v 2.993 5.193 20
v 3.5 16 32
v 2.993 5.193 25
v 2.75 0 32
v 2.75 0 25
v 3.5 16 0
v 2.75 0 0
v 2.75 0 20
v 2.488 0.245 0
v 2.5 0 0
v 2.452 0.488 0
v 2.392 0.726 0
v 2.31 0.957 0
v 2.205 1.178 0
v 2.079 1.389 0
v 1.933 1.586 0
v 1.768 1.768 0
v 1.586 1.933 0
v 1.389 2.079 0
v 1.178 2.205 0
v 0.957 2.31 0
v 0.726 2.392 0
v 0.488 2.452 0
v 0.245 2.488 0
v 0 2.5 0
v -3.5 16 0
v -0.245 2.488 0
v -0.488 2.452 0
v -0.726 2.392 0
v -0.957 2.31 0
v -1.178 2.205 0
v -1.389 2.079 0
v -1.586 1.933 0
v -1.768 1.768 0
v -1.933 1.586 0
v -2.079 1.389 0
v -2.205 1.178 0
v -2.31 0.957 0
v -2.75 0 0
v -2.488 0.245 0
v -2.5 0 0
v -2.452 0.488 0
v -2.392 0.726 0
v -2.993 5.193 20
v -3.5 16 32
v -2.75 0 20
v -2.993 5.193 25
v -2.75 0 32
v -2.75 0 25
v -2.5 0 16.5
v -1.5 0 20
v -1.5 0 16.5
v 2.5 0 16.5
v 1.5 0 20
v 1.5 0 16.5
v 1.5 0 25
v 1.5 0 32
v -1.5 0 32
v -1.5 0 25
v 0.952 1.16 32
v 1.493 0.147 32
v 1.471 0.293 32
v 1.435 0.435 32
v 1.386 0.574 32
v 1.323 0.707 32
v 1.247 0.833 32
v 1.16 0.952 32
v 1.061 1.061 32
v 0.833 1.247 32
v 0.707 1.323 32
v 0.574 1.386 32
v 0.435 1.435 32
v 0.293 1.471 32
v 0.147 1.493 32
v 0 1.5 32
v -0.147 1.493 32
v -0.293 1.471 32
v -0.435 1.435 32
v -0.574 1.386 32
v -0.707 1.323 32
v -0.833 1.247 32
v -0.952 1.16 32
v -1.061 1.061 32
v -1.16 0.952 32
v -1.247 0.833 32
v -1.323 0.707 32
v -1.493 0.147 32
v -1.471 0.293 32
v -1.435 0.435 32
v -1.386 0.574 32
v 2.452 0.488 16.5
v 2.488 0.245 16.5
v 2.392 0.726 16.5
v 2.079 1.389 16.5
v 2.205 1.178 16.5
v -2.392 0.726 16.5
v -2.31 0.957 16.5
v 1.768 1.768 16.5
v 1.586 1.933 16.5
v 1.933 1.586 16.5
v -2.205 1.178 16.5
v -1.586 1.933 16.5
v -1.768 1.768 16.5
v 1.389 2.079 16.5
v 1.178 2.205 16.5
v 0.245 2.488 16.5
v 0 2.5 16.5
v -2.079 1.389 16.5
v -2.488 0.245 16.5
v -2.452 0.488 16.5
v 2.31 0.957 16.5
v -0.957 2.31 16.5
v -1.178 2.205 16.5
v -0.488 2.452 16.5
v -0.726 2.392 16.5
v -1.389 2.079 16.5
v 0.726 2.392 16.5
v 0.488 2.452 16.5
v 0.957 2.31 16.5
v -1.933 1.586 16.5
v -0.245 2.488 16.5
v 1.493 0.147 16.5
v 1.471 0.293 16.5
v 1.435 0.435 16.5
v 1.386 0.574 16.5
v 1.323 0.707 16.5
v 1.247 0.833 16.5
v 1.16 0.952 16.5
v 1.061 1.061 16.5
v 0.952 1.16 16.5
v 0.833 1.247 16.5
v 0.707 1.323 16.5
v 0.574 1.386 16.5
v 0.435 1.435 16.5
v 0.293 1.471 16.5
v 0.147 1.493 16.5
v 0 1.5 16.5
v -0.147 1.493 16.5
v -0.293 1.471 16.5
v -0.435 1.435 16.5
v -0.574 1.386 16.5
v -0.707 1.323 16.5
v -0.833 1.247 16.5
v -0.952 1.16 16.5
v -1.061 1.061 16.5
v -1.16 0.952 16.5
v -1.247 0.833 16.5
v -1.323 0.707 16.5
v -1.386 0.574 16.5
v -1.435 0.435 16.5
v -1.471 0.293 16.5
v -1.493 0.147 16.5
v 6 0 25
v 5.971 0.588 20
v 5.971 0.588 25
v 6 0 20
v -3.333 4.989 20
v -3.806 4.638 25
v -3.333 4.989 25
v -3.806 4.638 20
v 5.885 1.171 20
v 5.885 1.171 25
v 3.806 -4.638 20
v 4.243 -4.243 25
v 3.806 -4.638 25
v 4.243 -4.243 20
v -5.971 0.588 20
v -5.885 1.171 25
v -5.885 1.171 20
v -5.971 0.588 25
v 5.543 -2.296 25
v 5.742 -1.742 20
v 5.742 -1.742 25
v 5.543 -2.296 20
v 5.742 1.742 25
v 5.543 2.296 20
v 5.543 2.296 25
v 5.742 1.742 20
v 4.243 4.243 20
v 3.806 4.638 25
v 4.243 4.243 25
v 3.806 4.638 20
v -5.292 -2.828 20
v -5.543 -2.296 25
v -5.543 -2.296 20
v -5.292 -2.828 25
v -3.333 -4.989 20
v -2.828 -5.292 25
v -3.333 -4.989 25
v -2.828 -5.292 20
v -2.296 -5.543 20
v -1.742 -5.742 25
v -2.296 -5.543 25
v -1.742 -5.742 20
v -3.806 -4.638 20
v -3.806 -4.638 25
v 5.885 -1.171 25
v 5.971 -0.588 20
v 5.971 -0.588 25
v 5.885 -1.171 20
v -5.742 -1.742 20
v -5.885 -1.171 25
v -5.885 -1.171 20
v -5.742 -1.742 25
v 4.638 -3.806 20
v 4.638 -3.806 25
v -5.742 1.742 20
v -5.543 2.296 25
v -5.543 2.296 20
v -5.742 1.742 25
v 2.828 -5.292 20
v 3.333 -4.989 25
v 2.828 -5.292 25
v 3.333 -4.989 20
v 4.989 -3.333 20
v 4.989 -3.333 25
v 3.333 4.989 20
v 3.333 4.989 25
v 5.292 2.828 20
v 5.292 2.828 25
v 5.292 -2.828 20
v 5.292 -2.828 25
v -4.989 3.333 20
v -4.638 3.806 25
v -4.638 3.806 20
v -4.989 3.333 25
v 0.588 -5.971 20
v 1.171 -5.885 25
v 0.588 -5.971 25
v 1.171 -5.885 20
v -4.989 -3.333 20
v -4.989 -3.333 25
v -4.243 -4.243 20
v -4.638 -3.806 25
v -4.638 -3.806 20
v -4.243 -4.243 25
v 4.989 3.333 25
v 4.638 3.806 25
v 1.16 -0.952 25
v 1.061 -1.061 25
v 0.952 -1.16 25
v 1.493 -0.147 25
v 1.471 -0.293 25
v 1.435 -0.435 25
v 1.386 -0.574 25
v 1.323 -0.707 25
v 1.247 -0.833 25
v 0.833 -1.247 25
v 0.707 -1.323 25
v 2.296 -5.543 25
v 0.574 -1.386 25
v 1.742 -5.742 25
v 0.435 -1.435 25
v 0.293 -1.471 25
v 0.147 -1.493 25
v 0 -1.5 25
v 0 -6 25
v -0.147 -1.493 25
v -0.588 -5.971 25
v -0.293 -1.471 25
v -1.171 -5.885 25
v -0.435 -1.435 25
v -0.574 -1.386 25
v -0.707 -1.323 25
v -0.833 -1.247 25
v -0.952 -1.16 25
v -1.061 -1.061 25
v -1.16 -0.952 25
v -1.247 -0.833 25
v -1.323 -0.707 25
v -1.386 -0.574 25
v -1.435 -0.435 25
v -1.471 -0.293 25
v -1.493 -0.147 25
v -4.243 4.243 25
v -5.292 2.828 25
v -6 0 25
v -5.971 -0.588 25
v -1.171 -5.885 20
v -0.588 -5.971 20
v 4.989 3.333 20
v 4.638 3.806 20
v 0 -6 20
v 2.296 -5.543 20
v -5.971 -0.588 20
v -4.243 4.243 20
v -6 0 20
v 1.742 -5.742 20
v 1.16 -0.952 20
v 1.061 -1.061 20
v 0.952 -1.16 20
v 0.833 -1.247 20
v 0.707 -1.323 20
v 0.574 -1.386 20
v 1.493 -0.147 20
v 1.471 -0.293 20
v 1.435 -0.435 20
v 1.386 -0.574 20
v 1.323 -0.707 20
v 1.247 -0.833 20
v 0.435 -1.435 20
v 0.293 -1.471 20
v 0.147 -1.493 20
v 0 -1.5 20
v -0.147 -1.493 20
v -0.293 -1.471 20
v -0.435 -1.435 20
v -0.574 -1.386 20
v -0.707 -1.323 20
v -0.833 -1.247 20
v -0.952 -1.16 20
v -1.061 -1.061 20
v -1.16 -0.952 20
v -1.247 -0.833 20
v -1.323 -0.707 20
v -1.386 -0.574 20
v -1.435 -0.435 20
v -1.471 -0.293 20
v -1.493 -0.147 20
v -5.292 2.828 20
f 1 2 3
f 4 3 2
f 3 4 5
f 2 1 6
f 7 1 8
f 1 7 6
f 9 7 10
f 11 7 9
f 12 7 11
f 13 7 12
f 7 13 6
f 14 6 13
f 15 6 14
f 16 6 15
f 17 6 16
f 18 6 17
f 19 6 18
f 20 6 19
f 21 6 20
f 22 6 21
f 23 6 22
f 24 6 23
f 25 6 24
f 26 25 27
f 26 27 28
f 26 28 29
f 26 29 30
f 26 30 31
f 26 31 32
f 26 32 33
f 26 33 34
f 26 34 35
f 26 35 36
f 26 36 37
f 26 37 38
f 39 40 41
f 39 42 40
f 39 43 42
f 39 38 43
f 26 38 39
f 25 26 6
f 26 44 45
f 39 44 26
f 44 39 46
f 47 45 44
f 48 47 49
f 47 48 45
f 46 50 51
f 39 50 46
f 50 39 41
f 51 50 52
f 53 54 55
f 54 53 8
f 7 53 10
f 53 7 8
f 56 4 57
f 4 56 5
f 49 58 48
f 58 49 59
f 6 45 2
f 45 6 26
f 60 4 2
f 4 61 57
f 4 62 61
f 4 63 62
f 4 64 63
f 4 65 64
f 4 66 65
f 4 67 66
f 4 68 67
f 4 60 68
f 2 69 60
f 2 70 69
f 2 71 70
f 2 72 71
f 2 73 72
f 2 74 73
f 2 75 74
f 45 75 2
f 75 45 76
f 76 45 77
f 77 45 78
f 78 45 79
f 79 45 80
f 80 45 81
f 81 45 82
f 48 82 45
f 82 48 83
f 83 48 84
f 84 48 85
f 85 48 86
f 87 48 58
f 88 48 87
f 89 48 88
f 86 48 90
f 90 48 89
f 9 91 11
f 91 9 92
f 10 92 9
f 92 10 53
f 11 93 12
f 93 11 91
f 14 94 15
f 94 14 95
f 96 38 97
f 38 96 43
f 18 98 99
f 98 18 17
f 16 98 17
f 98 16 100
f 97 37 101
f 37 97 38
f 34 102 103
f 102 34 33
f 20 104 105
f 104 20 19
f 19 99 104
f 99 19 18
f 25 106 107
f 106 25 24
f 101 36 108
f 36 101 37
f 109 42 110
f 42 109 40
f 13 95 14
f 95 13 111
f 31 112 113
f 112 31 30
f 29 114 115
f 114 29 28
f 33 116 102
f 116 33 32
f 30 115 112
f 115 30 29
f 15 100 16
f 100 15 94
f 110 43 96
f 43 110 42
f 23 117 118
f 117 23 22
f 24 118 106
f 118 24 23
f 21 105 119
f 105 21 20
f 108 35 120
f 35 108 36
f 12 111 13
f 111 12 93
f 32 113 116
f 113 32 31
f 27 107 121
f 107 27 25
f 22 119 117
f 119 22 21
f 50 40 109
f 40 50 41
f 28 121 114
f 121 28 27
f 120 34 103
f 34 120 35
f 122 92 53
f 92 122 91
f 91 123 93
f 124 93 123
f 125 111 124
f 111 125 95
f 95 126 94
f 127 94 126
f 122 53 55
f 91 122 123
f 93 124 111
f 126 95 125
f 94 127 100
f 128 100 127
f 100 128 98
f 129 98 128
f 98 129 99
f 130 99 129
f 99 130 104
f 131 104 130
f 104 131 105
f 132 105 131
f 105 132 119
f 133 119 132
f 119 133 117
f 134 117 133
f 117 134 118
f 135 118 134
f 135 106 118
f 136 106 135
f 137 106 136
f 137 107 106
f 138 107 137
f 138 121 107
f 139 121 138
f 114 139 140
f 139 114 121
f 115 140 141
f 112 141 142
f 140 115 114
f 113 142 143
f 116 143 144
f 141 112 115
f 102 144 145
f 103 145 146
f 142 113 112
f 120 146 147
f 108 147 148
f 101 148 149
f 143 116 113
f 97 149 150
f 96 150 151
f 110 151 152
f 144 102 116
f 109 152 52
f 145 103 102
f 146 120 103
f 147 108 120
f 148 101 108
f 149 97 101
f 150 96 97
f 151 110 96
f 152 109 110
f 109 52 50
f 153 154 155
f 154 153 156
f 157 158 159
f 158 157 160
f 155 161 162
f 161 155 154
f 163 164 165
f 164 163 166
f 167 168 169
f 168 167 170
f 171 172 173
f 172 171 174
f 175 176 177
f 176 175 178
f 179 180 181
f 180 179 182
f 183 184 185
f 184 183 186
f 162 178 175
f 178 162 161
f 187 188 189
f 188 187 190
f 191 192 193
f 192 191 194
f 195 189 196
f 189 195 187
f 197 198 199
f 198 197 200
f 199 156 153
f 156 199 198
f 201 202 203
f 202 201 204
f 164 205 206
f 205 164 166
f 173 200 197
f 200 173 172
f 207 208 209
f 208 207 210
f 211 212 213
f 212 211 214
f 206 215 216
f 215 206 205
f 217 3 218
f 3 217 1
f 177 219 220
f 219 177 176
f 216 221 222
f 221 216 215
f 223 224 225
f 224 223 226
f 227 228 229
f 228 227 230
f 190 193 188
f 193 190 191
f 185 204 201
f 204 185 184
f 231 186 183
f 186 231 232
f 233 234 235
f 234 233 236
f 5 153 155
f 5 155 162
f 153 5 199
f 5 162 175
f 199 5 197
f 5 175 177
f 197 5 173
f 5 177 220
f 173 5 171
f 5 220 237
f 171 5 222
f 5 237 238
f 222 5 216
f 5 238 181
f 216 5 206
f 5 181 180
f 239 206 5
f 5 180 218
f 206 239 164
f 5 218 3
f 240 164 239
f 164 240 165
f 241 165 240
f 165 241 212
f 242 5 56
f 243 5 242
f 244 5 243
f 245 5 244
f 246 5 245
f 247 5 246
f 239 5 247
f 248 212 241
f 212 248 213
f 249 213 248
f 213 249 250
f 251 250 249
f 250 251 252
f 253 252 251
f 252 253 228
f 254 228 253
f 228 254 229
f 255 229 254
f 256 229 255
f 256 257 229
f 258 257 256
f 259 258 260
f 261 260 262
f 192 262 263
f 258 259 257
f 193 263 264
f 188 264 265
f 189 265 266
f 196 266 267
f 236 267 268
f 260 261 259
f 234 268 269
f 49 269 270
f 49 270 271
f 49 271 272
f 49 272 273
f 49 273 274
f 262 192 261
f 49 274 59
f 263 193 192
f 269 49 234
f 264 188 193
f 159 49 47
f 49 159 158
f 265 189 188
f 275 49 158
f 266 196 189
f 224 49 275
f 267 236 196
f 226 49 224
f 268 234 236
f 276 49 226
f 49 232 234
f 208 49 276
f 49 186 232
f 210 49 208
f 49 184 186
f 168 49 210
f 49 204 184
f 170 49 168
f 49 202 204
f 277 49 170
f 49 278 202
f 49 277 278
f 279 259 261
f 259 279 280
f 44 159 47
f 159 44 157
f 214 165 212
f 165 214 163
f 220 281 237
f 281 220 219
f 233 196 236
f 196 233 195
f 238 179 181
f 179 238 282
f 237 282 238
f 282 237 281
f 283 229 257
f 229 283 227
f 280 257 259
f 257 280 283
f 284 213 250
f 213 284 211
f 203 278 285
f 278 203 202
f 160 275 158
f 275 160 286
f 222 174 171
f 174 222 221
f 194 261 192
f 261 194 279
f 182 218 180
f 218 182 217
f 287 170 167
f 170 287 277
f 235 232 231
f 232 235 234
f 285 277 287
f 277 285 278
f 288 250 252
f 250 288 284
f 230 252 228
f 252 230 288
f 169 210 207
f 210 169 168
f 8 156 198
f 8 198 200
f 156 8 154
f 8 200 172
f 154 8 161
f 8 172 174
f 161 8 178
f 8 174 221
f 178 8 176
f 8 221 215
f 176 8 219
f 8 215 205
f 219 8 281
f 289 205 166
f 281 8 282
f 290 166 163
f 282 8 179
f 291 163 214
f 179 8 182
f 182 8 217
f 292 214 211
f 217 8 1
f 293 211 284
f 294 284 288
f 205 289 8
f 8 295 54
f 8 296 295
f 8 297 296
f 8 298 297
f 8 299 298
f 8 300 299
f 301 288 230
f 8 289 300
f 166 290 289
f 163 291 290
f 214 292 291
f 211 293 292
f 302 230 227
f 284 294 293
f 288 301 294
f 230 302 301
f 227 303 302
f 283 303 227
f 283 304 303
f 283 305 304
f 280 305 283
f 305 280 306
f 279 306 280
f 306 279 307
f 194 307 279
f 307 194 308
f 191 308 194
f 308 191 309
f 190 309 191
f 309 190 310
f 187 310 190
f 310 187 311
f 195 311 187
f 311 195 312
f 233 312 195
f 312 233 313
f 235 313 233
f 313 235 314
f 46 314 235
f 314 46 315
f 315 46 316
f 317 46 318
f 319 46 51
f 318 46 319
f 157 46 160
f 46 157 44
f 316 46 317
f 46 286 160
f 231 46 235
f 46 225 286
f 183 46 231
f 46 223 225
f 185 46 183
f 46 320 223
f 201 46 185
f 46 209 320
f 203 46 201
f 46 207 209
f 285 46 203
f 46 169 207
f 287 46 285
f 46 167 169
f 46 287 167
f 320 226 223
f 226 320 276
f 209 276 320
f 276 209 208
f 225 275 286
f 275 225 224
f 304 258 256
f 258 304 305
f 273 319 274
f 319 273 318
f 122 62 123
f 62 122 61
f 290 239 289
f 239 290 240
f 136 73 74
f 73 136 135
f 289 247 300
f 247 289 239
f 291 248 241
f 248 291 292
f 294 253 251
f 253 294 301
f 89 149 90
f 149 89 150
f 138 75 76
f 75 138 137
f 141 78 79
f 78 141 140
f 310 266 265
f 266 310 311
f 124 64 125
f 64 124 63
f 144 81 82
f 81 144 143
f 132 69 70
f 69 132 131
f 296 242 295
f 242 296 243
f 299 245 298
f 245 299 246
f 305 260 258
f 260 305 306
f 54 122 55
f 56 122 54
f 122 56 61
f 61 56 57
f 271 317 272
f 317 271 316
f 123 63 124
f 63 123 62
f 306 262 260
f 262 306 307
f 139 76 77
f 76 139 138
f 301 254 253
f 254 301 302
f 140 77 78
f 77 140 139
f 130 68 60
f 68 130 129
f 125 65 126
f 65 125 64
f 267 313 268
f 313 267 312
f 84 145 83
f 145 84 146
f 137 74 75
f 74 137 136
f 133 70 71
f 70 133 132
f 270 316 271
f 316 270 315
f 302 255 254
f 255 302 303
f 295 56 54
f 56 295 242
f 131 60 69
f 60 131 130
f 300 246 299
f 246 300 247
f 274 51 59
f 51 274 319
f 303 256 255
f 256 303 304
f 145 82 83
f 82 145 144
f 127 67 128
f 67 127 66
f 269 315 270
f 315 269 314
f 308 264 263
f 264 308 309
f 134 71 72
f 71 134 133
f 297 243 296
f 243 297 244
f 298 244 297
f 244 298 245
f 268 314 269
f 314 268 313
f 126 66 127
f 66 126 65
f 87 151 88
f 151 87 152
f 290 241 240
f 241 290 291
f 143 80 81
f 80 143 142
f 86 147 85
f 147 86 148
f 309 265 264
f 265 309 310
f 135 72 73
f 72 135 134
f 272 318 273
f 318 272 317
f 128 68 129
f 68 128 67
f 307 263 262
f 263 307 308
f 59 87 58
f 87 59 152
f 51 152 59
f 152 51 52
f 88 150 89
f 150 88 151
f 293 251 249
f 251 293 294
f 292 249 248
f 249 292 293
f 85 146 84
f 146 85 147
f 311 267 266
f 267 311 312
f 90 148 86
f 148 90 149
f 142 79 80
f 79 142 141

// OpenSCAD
// Hose-barb reducer: 8 mm ID -> 5 mm ID
// Print orientation: standing upright along +Z

$fn = 64;

// ---- Dimensions (mm) ----
id_8     = 8;    // inner diameter of 8 mm tubing
id_5     = 5;    // inner diameter of 5 mm tubing
bore     = 3;    // through-bore diameter
length_8 = 20;   // height of 8 mm tubing section
length_c = 5;    // height of collar section
length_5 = 16;   // height of 5 mm tubing section (z = 25 to z = 41)
eps      = 0.5;  // overcut for clean differences

// ---- Derived ----
od_8_top = 9.5;  // outer diameter at top of 8 mm barbs
od_5_bot = 6.5;  // outer diameter at bottom of 5 mm barbs

module hose_barb(id, height, od_top, od_bot) {
    difference() {
        union() {
            // Sawtooth profile, stacked twice
            for (s = [0, 1])
                translate([0, 0, s * height])
                    linear_extrude(height = height)
                        polygon([
                            [-(od_bot + eps) / 2, 0],
                            [-(od_top + eps) / 2, height],
                            [(od_top + eps) / 2, height],
                            [(od_bot + eps) / 2, 0]
                        ]);
        }
        // Through bore
        translate([0, 0, -eps])
            cylinder(d = id, h = height + 2 * eps);
    }
}

difference() {
    union() {
        // 8 mm tubing section (z = 0 to 20)
        hose_barb(id_8, length_8, od_8_top, od_8_bot = 7.5);

        // Collar (z = 20 to 25)
        translate([0, 0, length_8])
            cylinder(d = 12, h = length_c);

        // 5 mm tubing section (z = 25 to 41)
        hose_barb(id_5, length_5, od_5_bot, 5.0);
    }

    // Through bore along full length
    translate([0, 0, -eps])
        cylinder(d = bore, h = length_8 + length_c + length_5 + 2 * eps);
}
